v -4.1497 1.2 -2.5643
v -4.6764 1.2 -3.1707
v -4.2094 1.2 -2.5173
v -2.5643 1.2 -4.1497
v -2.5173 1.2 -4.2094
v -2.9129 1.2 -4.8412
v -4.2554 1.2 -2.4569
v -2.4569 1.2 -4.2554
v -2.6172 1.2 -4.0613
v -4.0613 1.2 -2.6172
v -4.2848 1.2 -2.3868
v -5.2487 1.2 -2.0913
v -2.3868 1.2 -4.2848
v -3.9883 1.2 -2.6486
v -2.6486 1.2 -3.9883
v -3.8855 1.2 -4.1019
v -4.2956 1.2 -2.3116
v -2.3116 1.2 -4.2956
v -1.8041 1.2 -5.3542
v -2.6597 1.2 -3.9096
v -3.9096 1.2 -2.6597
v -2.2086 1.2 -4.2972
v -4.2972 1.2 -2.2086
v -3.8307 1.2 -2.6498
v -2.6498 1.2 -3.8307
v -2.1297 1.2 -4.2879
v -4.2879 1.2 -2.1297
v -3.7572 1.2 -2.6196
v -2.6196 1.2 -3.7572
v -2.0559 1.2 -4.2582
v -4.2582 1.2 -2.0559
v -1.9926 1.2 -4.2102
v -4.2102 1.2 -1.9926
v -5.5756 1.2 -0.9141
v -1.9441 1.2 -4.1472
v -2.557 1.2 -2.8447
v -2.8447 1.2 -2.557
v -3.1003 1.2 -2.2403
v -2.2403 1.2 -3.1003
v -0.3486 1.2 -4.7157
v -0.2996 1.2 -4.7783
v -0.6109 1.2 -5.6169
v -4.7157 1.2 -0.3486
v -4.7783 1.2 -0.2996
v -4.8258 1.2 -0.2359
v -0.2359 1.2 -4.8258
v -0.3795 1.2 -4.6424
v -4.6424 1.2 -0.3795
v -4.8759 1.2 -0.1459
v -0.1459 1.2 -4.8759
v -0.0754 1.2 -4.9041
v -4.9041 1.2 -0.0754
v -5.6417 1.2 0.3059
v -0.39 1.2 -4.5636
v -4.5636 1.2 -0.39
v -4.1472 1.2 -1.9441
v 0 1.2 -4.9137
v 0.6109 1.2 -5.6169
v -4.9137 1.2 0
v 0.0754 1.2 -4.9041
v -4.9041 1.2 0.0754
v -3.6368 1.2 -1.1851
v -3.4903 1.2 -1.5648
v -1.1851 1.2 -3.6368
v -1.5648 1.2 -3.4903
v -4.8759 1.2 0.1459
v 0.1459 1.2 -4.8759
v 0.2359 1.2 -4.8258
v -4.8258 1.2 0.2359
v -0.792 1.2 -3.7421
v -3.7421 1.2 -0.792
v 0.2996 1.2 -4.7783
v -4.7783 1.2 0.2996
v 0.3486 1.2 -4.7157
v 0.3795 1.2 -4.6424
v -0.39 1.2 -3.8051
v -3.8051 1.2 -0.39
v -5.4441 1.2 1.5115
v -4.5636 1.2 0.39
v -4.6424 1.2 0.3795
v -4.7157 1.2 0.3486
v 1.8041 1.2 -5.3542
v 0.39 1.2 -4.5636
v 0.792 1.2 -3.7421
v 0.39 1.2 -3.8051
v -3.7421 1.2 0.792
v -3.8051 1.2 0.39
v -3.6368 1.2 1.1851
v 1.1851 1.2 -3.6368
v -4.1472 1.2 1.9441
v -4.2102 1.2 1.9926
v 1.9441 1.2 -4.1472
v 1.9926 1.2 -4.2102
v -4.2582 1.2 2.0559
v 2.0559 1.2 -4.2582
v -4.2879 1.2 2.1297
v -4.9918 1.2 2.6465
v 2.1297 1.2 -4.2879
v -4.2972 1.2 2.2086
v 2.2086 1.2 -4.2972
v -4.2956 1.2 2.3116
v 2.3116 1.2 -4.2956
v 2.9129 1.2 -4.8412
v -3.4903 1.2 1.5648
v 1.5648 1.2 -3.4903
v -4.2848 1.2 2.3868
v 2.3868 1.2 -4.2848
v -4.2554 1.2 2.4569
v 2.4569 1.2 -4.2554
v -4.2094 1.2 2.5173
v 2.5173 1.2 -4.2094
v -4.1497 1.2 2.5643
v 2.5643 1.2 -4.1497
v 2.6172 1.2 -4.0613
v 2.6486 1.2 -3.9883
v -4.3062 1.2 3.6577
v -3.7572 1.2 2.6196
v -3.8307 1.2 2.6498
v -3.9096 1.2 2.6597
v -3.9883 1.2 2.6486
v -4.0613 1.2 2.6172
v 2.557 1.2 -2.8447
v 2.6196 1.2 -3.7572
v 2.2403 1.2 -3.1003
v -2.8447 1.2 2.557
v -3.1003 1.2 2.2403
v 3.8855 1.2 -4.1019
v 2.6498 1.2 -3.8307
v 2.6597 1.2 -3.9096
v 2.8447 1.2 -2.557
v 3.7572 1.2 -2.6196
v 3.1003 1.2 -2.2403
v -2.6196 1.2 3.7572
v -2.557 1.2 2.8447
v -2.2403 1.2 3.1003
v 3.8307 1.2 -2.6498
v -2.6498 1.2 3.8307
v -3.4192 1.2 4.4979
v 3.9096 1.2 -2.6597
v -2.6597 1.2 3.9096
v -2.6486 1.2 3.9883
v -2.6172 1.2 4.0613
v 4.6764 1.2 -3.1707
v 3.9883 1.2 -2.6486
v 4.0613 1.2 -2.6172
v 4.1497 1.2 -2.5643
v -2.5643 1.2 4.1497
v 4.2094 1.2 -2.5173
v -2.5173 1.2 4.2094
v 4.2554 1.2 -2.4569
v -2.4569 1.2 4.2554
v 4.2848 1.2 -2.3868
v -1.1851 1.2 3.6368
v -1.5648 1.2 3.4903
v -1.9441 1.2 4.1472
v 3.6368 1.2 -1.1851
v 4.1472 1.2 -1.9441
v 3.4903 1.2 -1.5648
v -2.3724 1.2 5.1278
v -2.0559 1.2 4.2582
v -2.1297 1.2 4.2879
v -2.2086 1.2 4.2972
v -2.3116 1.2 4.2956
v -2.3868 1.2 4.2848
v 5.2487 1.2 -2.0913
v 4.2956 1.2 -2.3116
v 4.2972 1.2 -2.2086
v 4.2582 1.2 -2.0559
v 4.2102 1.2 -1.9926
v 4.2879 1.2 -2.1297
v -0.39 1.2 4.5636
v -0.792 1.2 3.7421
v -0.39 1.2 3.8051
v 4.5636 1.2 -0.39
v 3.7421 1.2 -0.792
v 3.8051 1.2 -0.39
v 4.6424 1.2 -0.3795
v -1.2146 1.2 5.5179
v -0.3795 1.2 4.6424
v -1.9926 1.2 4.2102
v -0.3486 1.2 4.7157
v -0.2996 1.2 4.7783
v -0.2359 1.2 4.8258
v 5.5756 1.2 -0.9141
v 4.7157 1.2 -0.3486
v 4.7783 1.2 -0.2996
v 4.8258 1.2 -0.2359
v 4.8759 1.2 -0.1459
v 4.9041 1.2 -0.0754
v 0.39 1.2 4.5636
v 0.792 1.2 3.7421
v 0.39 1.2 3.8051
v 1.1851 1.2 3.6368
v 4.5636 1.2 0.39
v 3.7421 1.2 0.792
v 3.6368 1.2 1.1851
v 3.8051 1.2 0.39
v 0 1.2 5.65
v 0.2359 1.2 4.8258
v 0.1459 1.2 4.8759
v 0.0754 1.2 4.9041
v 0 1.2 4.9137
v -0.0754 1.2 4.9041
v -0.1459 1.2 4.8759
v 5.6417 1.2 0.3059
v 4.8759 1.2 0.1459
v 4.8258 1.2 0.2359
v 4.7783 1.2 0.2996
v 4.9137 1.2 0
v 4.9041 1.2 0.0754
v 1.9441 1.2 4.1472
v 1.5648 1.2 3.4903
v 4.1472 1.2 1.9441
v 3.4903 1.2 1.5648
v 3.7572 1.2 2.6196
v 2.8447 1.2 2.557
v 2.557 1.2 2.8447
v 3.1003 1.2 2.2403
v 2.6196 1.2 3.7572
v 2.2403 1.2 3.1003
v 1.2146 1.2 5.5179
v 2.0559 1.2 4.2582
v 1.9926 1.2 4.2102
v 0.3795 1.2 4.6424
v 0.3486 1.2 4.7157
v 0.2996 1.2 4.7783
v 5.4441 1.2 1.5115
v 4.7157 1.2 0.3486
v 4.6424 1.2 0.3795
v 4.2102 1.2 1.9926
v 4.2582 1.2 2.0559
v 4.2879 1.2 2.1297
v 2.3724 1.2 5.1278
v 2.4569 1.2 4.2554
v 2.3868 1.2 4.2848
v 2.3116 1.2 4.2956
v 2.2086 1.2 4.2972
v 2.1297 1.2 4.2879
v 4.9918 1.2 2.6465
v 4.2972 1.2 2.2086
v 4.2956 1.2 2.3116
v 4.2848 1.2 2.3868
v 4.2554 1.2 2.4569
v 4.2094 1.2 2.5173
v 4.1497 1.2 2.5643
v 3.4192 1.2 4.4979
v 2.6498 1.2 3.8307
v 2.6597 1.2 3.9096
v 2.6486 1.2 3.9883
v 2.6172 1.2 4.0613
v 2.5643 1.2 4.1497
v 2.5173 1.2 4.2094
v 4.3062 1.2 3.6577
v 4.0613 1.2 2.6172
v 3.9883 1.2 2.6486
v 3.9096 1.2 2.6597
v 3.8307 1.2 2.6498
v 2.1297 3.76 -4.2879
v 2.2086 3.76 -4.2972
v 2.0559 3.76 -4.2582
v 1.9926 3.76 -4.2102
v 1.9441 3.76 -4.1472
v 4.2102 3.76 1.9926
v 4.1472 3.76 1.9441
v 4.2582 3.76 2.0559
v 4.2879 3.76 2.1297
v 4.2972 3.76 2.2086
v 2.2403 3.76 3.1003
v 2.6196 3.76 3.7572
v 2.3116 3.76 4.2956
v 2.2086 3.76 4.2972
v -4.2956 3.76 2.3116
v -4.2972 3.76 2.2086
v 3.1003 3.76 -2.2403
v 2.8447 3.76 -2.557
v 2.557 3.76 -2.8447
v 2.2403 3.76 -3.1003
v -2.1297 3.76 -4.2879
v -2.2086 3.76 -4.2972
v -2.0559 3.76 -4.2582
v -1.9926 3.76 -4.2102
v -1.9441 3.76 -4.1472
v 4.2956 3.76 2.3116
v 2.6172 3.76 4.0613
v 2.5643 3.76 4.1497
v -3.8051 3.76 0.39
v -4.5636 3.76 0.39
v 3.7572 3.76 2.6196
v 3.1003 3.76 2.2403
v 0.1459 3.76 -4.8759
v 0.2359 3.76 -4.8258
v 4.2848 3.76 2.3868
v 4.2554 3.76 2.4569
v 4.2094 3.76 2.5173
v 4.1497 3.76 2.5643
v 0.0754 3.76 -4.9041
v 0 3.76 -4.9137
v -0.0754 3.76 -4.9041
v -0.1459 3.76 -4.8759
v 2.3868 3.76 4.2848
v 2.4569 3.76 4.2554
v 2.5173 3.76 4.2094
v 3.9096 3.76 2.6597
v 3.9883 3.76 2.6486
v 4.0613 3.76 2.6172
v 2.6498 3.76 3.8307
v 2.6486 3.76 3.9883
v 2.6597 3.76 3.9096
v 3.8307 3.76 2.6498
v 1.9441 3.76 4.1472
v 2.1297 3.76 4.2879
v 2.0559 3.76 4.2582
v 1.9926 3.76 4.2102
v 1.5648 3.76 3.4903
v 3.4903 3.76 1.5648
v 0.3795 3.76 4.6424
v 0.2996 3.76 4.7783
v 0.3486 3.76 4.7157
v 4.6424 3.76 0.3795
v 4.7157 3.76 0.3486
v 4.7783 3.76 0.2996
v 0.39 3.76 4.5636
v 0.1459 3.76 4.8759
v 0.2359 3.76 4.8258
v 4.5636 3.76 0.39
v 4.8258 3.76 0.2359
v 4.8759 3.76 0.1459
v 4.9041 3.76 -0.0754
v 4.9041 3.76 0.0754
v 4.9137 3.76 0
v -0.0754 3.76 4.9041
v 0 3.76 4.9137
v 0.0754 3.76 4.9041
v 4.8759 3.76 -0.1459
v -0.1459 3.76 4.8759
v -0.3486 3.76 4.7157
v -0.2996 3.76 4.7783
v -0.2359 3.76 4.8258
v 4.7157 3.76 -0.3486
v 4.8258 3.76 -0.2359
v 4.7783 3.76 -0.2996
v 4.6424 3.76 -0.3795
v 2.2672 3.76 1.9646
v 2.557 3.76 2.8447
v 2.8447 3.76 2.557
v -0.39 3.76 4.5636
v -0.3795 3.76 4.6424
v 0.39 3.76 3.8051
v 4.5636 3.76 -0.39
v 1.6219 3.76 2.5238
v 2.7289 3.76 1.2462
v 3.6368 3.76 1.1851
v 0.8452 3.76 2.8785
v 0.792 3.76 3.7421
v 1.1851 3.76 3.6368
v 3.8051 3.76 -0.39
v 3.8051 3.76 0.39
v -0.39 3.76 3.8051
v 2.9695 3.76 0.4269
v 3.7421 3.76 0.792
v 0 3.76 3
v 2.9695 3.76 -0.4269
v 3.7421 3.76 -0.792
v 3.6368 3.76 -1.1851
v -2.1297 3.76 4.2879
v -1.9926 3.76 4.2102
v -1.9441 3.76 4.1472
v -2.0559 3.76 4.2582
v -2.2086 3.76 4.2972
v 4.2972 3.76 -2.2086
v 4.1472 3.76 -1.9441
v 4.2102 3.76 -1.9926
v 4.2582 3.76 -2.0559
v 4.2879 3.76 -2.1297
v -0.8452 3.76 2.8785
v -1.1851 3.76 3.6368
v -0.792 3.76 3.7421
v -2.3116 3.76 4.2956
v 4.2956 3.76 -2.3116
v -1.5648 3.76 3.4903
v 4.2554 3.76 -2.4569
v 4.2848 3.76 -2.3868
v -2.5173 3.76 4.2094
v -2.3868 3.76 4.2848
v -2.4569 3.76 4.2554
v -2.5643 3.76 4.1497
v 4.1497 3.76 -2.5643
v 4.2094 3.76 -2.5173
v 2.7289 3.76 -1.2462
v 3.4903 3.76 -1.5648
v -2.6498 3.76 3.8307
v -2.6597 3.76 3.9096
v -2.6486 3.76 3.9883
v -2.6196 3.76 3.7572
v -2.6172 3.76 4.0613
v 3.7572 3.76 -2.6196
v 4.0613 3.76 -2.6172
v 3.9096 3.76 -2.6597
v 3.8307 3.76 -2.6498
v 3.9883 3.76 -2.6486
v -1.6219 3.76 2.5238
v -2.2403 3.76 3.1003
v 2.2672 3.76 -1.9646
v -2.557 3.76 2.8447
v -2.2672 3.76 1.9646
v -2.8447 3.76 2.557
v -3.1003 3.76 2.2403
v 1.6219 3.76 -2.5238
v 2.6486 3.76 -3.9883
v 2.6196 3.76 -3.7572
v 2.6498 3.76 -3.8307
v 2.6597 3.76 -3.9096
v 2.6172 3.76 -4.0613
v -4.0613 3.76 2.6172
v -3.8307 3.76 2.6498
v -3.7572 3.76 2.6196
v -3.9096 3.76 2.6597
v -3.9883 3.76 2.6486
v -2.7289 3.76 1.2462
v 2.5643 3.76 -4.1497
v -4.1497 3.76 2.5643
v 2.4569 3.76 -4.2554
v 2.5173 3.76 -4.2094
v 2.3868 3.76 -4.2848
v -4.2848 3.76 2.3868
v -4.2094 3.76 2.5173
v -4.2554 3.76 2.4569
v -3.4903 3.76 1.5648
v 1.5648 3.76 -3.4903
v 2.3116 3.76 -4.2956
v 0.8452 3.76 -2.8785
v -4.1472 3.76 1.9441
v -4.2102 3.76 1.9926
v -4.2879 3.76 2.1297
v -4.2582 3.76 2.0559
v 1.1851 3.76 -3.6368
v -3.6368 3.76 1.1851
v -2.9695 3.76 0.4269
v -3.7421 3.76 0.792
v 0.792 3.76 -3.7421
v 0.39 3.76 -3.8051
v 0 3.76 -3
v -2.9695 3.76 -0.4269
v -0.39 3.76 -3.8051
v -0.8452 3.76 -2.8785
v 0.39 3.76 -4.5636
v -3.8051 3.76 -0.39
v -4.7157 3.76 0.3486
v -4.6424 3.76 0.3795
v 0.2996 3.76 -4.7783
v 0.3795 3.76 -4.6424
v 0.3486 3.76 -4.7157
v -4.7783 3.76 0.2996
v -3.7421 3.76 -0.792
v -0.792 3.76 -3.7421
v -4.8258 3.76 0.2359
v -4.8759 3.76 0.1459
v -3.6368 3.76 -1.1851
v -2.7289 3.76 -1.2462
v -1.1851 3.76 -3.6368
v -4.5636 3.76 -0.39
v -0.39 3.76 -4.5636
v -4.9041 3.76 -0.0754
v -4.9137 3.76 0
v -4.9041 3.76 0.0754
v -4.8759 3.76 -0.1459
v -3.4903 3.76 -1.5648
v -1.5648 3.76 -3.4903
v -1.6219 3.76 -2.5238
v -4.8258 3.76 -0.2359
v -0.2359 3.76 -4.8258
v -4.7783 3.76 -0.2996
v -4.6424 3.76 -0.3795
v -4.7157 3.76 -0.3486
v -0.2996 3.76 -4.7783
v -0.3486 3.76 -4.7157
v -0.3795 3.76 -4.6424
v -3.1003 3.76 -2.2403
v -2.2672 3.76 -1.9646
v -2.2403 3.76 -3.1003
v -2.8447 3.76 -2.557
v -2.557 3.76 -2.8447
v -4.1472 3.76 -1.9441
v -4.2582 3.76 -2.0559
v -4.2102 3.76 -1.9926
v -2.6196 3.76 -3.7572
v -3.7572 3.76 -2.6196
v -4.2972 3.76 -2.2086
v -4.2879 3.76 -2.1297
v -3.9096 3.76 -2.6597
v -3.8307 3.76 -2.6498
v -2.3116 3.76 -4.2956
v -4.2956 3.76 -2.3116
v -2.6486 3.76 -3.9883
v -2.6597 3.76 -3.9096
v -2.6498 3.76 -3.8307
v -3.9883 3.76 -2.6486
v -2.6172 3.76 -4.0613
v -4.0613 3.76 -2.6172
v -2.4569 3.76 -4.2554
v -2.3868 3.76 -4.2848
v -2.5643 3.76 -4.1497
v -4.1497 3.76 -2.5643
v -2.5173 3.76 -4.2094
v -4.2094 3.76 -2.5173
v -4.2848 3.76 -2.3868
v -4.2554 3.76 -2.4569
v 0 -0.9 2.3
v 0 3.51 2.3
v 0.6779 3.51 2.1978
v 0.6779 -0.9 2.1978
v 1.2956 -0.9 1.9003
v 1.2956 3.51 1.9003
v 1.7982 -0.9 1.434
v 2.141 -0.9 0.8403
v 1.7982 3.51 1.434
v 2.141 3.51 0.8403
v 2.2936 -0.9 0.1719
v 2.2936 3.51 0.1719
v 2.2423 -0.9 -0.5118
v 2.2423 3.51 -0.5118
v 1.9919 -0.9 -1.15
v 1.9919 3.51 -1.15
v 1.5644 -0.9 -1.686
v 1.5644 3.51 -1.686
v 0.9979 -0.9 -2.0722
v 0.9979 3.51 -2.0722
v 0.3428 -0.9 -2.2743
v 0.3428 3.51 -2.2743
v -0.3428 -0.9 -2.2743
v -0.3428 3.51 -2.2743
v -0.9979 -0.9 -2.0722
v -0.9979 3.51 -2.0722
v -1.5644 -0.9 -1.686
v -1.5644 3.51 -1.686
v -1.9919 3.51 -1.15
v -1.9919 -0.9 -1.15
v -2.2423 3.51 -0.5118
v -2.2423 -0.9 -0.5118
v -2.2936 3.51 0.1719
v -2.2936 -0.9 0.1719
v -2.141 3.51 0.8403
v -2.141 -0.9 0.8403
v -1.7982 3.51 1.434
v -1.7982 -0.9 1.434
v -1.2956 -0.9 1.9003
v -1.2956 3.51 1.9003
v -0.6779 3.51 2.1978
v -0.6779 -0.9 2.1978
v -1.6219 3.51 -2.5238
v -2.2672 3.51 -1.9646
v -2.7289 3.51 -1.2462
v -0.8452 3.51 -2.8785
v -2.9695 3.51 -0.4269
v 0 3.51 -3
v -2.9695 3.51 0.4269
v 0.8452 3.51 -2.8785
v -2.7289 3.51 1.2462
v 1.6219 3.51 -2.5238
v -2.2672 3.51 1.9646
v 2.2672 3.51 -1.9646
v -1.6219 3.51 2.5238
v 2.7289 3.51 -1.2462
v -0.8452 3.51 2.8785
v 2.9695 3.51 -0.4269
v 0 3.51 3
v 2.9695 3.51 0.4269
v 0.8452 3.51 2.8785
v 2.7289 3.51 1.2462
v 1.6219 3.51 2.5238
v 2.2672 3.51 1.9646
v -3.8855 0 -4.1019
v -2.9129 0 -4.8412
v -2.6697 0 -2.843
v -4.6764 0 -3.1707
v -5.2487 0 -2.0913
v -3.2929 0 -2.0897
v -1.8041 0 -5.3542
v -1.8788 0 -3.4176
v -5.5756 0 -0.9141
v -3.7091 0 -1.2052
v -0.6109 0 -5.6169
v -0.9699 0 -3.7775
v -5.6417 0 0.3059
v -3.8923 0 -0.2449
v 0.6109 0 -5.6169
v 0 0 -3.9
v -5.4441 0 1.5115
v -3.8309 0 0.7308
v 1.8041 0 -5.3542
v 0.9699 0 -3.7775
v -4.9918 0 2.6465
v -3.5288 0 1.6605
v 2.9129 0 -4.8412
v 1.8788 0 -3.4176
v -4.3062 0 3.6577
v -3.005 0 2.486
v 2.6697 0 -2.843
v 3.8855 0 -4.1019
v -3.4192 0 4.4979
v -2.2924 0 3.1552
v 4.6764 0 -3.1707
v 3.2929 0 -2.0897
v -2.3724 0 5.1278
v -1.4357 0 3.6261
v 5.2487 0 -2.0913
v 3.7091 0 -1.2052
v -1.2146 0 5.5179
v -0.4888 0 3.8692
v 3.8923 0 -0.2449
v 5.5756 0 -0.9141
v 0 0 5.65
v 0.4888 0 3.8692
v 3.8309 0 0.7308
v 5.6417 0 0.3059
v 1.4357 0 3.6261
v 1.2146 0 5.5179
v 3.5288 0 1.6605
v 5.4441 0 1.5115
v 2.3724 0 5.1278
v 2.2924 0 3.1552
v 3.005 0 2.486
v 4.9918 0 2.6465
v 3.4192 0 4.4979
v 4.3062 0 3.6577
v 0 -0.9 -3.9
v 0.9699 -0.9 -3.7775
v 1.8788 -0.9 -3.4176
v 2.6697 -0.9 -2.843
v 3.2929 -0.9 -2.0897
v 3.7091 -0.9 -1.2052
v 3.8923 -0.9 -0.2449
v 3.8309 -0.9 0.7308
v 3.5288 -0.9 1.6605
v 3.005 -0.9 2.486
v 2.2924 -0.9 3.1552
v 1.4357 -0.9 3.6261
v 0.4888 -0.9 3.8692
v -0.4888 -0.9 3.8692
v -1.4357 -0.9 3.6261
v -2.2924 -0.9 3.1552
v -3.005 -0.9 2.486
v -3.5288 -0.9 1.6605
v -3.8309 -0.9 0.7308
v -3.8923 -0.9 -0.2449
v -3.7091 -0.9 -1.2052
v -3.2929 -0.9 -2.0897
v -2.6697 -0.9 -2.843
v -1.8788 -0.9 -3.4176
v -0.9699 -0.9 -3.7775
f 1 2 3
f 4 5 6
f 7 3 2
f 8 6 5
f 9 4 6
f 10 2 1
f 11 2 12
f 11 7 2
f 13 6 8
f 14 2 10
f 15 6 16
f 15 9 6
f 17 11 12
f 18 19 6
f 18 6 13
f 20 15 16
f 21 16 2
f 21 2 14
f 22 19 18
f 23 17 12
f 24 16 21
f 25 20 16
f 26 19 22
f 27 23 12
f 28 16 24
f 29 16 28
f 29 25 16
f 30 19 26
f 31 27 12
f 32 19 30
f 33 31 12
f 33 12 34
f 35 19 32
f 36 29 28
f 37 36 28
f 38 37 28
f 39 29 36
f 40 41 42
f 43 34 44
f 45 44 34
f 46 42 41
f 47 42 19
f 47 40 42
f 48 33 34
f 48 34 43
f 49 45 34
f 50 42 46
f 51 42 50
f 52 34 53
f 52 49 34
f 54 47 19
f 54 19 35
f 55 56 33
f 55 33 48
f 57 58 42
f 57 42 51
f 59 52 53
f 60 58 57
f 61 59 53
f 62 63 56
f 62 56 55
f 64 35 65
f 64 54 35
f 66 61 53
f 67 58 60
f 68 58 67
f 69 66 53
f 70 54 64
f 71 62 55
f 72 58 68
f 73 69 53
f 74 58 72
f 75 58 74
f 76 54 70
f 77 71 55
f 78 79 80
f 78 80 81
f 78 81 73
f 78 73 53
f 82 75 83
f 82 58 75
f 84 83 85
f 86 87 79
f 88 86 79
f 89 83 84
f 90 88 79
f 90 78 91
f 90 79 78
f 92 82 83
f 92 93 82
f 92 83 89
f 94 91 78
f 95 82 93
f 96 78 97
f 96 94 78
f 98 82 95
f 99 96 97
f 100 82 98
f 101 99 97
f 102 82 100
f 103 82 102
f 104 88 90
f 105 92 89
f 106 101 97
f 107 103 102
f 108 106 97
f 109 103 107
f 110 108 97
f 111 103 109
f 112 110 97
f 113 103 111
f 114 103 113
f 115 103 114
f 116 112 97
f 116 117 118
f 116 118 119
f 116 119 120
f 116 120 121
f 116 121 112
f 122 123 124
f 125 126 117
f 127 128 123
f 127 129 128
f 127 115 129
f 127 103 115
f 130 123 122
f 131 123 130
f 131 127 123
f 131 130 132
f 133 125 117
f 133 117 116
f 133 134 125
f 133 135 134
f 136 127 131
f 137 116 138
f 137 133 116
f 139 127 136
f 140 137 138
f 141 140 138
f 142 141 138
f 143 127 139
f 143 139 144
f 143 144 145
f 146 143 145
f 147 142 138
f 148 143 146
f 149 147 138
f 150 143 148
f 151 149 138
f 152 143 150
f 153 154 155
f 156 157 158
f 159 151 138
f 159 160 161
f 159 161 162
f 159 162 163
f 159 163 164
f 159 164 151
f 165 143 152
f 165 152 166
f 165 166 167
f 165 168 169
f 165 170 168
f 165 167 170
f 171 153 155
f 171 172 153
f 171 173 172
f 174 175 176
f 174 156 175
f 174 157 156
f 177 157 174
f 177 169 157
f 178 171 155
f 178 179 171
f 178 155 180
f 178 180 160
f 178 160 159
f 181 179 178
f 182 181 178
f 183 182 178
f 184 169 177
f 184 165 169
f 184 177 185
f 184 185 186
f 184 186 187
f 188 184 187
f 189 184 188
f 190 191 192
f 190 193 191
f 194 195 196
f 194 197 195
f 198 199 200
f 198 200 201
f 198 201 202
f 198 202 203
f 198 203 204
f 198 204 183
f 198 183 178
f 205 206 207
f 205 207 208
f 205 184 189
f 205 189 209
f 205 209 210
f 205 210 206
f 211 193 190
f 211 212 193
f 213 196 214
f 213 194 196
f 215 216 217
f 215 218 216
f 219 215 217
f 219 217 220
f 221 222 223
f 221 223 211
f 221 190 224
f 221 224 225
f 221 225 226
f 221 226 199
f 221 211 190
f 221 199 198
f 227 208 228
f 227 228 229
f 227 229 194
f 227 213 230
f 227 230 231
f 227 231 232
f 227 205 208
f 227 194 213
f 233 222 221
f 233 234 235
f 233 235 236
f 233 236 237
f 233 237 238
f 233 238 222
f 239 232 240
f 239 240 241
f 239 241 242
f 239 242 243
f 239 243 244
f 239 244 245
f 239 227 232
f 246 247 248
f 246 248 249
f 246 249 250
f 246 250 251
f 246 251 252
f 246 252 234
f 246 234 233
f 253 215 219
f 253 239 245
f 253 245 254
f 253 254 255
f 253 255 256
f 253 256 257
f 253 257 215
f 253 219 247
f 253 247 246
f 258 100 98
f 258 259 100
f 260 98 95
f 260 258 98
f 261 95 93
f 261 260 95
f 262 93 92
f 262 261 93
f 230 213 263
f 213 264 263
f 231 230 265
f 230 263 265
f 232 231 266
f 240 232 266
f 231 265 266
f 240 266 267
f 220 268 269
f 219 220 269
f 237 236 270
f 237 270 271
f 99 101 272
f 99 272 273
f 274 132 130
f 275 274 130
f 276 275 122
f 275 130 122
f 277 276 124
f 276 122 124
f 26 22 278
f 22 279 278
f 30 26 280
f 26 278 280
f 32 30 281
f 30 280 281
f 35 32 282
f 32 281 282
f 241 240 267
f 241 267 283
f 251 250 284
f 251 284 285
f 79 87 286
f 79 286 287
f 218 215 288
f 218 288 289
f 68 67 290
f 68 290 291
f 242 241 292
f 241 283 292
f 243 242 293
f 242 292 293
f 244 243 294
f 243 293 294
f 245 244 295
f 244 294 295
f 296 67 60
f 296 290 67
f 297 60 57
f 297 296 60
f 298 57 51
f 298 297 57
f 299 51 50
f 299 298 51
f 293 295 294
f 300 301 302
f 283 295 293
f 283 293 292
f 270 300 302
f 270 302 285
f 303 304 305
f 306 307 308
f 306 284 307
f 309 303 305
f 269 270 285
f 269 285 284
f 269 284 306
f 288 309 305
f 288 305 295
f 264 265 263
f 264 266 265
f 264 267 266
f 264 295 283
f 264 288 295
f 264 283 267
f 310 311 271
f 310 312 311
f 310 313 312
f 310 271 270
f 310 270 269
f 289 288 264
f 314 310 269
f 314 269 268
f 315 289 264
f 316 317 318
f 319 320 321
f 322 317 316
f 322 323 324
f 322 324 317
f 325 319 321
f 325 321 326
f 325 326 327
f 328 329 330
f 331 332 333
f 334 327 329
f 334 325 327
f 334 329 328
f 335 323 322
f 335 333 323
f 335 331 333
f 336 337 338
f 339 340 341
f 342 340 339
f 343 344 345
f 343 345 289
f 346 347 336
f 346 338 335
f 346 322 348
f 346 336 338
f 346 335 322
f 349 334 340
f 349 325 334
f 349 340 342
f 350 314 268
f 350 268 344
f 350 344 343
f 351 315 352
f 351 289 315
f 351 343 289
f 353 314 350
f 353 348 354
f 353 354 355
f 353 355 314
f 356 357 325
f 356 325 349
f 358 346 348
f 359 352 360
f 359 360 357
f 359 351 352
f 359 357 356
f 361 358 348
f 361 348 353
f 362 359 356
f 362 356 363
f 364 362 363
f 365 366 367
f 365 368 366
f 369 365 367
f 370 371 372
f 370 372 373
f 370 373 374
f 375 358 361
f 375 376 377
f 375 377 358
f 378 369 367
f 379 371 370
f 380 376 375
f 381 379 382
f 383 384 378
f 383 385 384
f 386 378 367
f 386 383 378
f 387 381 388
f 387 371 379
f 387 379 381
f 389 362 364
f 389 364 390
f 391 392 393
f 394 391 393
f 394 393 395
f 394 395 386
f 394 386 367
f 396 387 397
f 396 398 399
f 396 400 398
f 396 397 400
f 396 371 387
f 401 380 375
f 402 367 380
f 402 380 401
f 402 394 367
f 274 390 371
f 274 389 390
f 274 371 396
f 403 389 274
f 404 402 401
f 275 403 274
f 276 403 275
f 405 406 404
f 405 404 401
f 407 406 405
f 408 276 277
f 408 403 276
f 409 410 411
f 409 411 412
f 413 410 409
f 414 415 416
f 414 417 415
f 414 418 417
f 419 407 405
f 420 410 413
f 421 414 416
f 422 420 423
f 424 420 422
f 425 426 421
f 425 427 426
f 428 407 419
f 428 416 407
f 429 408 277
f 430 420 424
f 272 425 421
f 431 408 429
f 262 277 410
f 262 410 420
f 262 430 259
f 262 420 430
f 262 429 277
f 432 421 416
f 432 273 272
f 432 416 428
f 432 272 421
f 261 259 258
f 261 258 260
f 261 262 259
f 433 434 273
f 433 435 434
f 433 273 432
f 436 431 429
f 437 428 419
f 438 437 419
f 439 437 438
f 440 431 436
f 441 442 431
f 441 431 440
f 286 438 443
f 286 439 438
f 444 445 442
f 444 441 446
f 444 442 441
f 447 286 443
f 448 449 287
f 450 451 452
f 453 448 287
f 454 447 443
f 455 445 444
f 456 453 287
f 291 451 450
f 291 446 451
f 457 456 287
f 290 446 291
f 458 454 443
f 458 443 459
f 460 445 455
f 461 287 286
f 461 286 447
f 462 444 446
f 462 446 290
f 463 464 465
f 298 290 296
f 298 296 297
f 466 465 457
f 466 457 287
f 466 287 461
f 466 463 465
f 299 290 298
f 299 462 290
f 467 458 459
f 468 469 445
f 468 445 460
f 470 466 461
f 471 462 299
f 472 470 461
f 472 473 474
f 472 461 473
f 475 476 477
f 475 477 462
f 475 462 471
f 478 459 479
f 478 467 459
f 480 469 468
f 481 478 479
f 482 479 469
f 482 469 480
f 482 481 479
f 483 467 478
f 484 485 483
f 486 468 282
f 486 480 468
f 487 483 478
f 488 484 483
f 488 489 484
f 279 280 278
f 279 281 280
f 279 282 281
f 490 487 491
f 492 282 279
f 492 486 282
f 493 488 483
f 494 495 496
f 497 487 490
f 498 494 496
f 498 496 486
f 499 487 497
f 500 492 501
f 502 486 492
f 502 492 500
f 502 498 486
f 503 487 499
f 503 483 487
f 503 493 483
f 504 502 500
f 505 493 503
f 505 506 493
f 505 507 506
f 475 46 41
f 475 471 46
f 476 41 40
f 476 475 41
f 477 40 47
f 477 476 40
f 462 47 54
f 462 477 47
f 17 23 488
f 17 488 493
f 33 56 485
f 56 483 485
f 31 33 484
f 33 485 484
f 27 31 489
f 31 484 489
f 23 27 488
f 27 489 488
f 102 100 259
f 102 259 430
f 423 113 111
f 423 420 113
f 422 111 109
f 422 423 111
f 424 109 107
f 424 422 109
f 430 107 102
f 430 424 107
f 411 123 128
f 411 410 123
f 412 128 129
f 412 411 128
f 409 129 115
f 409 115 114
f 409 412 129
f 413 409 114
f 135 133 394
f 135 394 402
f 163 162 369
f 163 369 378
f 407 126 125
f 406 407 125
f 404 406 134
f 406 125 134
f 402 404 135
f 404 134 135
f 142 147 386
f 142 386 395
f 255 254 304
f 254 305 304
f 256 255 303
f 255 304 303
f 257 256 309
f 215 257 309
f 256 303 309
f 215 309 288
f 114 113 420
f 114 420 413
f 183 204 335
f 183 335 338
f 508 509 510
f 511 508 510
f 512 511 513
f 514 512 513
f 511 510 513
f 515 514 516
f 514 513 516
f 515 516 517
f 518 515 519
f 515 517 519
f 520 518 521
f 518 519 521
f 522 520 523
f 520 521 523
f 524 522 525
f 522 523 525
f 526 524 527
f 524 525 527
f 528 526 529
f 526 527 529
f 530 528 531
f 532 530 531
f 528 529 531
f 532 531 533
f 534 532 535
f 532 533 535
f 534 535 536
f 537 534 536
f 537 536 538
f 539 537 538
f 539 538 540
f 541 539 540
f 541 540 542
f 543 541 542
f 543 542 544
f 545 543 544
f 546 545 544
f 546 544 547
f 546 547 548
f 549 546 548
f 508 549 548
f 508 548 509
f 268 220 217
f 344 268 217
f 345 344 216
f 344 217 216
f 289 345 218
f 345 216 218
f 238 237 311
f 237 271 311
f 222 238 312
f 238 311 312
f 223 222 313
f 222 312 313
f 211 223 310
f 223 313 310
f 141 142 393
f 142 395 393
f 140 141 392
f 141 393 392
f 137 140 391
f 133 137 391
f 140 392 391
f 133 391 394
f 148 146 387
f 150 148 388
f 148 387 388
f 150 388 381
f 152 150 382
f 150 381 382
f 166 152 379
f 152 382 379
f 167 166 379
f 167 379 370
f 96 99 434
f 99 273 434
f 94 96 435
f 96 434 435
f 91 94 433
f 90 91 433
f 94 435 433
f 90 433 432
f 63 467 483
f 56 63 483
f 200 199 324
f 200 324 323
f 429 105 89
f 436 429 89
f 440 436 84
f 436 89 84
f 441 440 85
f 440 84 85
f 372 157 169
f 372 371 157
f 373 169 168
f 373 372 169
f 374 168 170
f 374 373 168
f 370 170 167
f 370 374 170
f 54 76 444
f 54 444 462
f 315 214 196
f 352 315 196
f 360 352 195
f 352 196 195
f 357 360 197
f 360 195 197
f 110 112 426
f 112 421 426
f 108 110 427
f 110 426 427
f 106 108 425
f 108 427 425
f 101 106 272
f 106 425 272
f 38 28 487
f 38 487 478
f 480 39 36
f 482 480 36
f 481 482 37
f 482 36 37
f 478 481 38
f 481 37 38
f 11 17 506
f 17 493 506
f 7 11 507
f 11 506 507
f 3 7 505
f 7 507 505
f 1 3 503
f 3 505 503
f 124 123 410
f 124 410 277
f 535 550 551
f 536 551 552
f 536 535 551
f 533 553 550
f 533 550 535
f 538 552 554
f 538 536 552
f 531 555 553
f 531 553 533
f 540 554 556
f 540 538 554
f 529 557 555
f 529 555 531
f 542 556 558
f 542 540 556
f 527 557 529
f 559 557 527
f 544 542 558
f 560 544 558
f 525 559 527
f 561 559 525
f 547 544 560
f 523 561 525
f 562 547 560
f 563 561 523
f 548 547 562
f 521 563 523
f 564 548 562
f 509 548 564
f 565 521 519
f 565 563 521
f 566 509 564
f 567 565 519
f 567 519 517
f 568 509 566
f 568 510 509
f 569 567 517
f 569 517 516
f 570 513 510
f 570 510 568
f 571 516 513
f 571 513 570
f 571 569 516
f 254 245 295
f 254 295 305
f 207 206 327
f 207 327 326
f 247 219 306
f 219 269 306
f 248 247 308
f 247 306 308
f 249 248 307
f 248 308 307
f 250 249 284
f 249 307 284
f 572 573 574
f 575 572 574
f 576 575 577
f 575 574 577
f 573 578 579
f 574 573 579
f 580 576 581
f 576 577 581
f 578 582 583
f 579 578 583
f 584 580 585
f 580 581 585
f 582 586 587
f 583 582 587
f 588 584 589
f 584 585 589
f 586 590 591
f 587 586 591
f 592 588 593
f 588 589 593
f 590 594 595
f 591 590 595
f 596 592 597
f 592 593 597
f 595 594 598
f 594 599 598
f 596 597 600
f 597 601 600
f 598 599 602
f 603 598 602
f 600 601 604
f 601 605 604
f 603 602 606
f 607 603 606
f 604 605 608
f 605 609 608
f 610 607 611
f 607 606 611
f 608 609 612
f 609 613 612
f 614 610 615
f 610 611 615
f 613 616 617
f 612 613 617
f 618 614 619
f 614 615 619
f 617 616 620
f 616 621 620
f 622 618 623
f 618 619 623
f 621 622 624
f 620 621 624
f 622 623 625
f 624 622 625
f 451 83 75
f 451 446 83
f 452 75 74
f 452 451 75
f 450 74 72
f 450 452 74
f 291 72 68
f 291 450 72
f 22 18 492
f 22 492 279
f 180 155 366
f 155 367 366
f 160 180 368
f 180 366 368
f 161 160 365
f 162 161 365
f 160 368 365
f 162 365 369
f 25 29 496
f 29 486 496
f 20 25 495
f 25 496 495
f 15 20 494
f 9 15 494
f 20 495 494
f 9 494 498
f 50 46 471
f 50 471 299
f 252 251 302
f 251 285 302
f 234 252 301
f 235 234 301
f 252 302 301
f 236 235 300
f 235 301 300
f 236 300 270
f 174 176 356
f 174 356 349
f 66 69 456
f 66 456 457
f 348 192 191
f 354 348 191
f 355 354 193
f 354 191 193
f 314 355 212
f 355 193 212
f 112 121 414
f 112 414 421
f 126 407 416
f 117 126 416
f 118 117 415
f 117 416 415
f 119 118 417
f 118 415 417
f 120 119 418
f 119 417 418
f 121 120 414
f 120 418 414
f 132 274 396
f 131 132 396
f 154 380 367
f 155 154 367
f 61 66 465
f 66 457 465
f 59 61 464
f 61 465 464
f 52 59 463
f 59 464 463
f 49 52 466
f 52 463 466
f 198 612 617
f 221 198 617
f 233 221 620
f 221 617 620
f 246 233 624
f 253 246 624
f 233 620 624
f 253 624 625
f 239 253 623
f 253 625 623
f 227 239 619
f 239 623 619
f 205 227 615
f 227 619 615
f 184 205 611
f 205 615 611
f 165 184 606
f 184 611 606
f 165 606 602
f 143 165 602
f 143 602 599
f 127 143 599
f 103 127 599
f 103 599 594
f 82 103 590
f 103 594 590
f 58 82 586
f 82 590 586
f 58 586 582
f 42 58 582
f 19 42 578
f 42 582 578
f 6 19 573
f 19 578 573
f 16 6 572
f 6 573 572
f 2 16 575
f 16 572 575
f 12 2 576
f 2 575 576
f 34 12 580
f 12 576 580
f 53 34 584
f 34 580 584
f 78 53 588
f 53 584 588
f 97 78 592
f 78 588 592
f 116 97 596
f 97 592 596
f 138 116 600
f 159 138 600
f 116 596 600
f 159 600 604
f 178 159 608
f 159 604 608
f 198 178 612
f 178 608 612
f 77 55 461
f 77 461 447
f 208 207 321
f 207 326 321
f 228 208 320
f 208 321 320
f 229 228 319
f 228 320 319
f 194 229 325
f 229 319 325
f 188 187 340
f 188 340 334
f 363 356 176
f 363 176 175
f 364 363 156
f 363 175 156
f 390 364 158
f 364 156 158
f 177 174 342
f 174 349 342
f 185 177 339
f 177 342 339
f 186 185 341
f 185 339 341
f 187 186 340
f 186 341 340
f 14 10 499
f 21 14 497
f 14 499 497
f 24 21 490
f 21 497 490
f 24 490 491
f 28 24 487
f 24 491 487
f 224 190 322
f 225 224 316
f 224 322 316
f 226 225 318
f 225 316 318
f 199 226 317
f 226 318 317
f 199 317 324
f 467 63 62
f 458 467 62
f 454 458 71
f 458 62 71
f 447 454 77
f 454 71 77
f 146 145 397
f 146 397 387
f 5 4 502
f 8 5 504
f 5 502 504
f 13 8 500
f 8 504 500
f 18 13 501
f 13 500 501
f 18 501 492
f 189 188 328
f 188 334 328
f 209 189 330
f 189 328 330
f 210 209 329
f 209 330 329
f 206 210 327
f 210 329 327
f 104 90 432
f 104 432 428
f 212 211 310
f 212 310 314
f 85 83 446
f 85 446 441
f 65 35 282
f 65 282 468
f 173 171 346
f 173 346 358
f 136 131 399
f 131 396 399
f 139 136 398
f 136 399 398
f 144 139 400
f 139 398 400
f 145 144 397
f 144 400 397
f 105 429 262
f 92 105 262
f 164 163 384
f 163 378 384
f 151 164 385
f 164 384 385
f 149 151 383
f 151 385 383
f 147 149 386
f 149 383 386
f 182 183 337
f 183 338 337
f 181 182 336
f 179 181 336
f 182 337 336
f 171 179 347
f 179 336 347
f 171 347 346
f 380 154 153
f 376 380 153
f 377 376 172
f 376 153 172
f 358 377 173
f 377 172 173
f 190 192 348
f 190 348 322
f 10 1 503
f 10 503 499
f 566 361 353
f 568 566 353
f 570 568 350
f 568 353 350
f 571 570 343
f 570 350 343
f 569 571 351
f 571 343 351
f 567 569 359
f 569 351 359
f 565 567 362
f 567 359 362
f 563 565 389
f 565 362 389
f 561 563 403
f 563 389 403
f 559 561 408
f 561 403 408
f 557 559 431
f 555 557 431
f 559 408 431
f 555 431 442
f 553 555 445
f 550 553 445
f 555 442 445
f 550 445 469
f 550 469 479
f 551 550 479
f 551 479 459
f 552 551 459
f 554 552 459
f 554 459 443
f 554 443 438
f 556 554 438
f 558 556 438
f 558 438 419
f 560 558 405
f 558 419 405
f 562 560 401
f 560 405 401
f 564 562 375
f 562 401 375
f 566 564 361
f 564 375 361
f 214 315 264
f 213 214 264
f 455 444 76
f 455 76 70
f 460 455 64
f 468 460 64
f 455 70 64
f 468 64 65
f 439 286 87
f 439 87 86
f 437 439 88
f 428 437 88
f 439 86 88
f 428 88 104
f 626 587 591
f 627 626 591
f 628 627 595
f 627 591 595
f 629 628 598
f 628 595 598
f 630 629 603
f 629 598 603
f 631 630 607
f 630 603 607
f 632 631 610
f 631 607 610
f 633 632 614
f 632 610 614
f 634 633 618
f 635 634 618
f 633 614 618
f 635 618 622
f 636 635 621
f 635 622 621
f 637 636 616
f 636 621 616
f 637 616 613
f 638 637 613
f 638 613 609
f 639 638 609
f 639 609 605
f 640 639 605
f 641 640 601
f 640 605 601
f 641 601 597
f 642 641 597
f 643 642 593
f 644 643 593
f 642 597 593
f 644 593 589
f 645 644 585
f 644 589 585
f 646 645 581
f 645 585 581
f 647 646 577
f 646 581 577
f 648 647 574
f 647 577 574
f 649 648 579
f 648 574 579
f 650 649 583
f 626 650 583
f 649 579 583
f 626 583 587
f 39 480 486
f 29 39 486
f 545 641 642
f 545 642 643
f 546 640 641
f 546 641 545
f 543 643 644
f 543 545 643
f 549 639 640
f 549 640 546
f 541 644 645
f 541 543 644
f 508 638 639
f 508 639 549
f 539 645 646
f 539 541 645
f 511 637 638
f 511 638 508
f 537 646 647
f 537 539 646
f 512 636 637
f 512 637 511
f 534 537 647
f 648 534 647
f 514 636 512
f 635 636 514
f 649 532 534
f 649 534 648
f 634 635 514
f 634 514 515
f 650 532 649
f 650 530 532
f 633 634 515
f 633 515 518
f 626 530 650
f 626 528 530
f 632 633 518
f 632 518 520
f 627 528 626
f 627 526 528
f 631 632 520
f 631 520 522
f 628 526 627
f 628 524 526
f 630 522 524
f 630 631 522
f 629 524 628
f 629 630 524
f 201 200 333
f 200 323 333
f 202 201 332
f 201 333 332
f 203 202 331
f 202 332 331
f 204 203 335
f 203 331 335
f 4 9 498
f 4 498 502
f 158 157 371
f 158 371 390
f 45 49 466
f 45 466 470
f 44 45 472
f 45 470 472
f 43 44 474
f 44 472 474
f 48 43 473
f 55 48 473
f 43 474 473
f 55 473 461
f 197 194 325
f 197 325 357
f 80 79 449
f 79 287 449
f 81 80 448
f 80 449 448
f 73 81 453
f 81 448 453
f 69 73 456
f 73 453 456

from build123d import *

# Parameters (mm, degrees)
SKETCH2_R                 = 5.65
BOSS_EXTRUDE1_DEPTH       = 1.2
SKETCH3_R                 = 3.825
BOSS_EXTRUDE2_DEPTH       = 2.56
SKETCH5_R                 = 3.9
BOSS_EXTRUDE4_DEPTH       = 0.9
BOSS_EXTRUDE5_DEPTH       = 2.56
FILLET12_R                = 0.3
CIRPATTERN3_COUNT         = 12
FILLET12_OF_CIRPATTERN3_R = 0.3
SKETCH10_R                = 2.3
CUT_EXTRUDE3_DEPTH        = 10.249897297
SKETCH11_R                = 3
CUT_EXTRUDE4_DEPTH        = 0.25


with BuildPart() as part:
    # Sketch2 → Boss-Extrude1 (new body)
    with BuildSketch(Plane(origin=(0, 0, 0), x_dir=(1, 0, 0), z_dir=(0, 1, 0))):
        with Locations(Location((0, 0, 0), (0, 0, 270))):
            Circle(SKETCH2_R)
    extrude(amount=BOSS_EXTRUDE1_DEPTH)

    # Sketch3 → Boss-Extrude2 (add)
    with BuildSketch(Plane(origin=(0, 1.2, 0), x_dir=(1, 0, 0), z_dir=(0, 1, 0))):
        with Locations(Location((0, 0, 0), (0, 0, 90))):
            Circle(SKETCH3_R)
    extrude(amount=BOSS_EXTRUDE2_DEPTH)

    # Sketch5 → Boss-Extrude4 (add)
    with BuildSketch(Plane.XZ):
        with Locations(Location((0, 0, 0), (0, 0, 270))):
            Circle(SKETCH5_R)
    extrude(amount=BOSS_EXTRUDE4_DEPTH)

    # Sketch9 → Boss-Extrude5 (add)
    with BuildSketch(Plane(origin=(0, 1.2, 0), x_dir=(1, 0, 0), z_dir=(0, 1, 0))):
        Polygon((0.39, 2.91), (-0.39, 2.91), (-0.39, 4.74), (0, 4.957049268), (0.39, 4.74), align=None)
    boss_extrude5 = extrude(amount=BOSS_EXTRUDE5_DEPTH)

    # Fillet12
    fillet12_edges = [part.edges().sort_by_distance(p)[0] for p in [
        (-0.39, 2.48, -4.74),
        (0, 2.48, -4.957049268),
        (0.39, 2.48, -4.74),
    ]]
    fillet(fillet12_edges, radius=FILLET12_R)

    # CirPattern3: Boss-Extrude5 ×12 about axis
    cirpattern3_axis = Axis((0, 0, 0), (0, 1, 0))
    for i in range(1, CIRPATTERN3_COUNT):
        add(boss_extrude5.rotate(cirpattern3_axis, i * 360 / CIRPATTERN3_COUNT))

    # Fillet12 of CirPattern3
    fillet12_of_cirpattern3_edges = [part.edges().sort_by_distance(p)[0] for p in [
        (-2.707749907, 2.48, -3.909960414),
        (-2.478524634, 2.48, -4.292930594),
        (-2.032250093, 2.48, -4.299960414),
        (-4.299960414, 2.48, -2.032250093),
        (-4.292930594, 2.48, -2.478524634),
        (-3.909960414, 2.48, -2.707749907),
        (-4.74, 2.48, 0.39),
        (-4.957049268, 2.48, 0),
        (-4.74, 2.48, -0.39),
        (-3.909960414, 2.48, 2.707749907),
        (-4.292930594, 2.48, 2.478524634),
        (-4.299960414, 2.48, 2.032250093),
        (-2.032250093, 2.48, 4.299960414),
        (-2.478524634, 2.48, 4.292930594),
        (-2.707749907, 2.48, 3.909960414),
        (0.39, 2.48, 4.74),
        (0, 2.48, 4.957049268),
        (-0.39, 2.48, 4.74),
        (2.707749907, 2.48, 3.909960414),
        (2.478524634, 2.48, 4.292930594),
        (2.032250093, 2.48, 4.299960414),
        (4.299960414, 2.48, 2.032250093),
        (4.292930594, 2.48, 2.478524634),
        (3.909960414, 2.48, 2.707749907),
        (4.74, 2.48, -0.39),
        (4.957049268, 2.48, 0),
        (4.74, 2.48, 0.39),
        (3.909960414, 2.48, -2.707749907),
        (4.292930594, 2.48, -2.478524634),
        (4.299960414, 2.48, -2.032250093),
        (2.032250093, 2.48, -4.299960414),
        (2.478524634, 2.48, -4.292930594),
        (2.707749907, 2.48, -3.909960414),
    ]]
    fillet(fillet12_of_cirpattern3_edges, radius=FILLET12_OF_CIRPATTERN3_R)

    # Sketch10 → Cut-Extrude3 (cut, through all)
    with BuildSketch(Plane(origin=(0, 3.76, 0), x_dir=(1, 0, 0), z_dir=(0, 1, 0))):
        with Locations(Location((0, 0, 0), (0, 0, 270))):
            Circle(SKETCH10_R)
    extrude(amount=-CUT_EXTRUDE3_DEPTH, mode=Mode.SUBTRACT)

    # Sketch11 → Cut-Extrude4 (cut)
    with BuildSketch(Plane(origin=(0, 3.76, 0), x_dir=(1, 0, 0), z_dir=(0, 1, 0))):
        with Locations(Location((0, 0, 0), (0, 0, 270))):
            Circle(SKETCH11_R)
    extrude(amount=-CUT_EXTRUDE4_DEPTH, mode=Mode.SUBTRACT)


solid = part.part
